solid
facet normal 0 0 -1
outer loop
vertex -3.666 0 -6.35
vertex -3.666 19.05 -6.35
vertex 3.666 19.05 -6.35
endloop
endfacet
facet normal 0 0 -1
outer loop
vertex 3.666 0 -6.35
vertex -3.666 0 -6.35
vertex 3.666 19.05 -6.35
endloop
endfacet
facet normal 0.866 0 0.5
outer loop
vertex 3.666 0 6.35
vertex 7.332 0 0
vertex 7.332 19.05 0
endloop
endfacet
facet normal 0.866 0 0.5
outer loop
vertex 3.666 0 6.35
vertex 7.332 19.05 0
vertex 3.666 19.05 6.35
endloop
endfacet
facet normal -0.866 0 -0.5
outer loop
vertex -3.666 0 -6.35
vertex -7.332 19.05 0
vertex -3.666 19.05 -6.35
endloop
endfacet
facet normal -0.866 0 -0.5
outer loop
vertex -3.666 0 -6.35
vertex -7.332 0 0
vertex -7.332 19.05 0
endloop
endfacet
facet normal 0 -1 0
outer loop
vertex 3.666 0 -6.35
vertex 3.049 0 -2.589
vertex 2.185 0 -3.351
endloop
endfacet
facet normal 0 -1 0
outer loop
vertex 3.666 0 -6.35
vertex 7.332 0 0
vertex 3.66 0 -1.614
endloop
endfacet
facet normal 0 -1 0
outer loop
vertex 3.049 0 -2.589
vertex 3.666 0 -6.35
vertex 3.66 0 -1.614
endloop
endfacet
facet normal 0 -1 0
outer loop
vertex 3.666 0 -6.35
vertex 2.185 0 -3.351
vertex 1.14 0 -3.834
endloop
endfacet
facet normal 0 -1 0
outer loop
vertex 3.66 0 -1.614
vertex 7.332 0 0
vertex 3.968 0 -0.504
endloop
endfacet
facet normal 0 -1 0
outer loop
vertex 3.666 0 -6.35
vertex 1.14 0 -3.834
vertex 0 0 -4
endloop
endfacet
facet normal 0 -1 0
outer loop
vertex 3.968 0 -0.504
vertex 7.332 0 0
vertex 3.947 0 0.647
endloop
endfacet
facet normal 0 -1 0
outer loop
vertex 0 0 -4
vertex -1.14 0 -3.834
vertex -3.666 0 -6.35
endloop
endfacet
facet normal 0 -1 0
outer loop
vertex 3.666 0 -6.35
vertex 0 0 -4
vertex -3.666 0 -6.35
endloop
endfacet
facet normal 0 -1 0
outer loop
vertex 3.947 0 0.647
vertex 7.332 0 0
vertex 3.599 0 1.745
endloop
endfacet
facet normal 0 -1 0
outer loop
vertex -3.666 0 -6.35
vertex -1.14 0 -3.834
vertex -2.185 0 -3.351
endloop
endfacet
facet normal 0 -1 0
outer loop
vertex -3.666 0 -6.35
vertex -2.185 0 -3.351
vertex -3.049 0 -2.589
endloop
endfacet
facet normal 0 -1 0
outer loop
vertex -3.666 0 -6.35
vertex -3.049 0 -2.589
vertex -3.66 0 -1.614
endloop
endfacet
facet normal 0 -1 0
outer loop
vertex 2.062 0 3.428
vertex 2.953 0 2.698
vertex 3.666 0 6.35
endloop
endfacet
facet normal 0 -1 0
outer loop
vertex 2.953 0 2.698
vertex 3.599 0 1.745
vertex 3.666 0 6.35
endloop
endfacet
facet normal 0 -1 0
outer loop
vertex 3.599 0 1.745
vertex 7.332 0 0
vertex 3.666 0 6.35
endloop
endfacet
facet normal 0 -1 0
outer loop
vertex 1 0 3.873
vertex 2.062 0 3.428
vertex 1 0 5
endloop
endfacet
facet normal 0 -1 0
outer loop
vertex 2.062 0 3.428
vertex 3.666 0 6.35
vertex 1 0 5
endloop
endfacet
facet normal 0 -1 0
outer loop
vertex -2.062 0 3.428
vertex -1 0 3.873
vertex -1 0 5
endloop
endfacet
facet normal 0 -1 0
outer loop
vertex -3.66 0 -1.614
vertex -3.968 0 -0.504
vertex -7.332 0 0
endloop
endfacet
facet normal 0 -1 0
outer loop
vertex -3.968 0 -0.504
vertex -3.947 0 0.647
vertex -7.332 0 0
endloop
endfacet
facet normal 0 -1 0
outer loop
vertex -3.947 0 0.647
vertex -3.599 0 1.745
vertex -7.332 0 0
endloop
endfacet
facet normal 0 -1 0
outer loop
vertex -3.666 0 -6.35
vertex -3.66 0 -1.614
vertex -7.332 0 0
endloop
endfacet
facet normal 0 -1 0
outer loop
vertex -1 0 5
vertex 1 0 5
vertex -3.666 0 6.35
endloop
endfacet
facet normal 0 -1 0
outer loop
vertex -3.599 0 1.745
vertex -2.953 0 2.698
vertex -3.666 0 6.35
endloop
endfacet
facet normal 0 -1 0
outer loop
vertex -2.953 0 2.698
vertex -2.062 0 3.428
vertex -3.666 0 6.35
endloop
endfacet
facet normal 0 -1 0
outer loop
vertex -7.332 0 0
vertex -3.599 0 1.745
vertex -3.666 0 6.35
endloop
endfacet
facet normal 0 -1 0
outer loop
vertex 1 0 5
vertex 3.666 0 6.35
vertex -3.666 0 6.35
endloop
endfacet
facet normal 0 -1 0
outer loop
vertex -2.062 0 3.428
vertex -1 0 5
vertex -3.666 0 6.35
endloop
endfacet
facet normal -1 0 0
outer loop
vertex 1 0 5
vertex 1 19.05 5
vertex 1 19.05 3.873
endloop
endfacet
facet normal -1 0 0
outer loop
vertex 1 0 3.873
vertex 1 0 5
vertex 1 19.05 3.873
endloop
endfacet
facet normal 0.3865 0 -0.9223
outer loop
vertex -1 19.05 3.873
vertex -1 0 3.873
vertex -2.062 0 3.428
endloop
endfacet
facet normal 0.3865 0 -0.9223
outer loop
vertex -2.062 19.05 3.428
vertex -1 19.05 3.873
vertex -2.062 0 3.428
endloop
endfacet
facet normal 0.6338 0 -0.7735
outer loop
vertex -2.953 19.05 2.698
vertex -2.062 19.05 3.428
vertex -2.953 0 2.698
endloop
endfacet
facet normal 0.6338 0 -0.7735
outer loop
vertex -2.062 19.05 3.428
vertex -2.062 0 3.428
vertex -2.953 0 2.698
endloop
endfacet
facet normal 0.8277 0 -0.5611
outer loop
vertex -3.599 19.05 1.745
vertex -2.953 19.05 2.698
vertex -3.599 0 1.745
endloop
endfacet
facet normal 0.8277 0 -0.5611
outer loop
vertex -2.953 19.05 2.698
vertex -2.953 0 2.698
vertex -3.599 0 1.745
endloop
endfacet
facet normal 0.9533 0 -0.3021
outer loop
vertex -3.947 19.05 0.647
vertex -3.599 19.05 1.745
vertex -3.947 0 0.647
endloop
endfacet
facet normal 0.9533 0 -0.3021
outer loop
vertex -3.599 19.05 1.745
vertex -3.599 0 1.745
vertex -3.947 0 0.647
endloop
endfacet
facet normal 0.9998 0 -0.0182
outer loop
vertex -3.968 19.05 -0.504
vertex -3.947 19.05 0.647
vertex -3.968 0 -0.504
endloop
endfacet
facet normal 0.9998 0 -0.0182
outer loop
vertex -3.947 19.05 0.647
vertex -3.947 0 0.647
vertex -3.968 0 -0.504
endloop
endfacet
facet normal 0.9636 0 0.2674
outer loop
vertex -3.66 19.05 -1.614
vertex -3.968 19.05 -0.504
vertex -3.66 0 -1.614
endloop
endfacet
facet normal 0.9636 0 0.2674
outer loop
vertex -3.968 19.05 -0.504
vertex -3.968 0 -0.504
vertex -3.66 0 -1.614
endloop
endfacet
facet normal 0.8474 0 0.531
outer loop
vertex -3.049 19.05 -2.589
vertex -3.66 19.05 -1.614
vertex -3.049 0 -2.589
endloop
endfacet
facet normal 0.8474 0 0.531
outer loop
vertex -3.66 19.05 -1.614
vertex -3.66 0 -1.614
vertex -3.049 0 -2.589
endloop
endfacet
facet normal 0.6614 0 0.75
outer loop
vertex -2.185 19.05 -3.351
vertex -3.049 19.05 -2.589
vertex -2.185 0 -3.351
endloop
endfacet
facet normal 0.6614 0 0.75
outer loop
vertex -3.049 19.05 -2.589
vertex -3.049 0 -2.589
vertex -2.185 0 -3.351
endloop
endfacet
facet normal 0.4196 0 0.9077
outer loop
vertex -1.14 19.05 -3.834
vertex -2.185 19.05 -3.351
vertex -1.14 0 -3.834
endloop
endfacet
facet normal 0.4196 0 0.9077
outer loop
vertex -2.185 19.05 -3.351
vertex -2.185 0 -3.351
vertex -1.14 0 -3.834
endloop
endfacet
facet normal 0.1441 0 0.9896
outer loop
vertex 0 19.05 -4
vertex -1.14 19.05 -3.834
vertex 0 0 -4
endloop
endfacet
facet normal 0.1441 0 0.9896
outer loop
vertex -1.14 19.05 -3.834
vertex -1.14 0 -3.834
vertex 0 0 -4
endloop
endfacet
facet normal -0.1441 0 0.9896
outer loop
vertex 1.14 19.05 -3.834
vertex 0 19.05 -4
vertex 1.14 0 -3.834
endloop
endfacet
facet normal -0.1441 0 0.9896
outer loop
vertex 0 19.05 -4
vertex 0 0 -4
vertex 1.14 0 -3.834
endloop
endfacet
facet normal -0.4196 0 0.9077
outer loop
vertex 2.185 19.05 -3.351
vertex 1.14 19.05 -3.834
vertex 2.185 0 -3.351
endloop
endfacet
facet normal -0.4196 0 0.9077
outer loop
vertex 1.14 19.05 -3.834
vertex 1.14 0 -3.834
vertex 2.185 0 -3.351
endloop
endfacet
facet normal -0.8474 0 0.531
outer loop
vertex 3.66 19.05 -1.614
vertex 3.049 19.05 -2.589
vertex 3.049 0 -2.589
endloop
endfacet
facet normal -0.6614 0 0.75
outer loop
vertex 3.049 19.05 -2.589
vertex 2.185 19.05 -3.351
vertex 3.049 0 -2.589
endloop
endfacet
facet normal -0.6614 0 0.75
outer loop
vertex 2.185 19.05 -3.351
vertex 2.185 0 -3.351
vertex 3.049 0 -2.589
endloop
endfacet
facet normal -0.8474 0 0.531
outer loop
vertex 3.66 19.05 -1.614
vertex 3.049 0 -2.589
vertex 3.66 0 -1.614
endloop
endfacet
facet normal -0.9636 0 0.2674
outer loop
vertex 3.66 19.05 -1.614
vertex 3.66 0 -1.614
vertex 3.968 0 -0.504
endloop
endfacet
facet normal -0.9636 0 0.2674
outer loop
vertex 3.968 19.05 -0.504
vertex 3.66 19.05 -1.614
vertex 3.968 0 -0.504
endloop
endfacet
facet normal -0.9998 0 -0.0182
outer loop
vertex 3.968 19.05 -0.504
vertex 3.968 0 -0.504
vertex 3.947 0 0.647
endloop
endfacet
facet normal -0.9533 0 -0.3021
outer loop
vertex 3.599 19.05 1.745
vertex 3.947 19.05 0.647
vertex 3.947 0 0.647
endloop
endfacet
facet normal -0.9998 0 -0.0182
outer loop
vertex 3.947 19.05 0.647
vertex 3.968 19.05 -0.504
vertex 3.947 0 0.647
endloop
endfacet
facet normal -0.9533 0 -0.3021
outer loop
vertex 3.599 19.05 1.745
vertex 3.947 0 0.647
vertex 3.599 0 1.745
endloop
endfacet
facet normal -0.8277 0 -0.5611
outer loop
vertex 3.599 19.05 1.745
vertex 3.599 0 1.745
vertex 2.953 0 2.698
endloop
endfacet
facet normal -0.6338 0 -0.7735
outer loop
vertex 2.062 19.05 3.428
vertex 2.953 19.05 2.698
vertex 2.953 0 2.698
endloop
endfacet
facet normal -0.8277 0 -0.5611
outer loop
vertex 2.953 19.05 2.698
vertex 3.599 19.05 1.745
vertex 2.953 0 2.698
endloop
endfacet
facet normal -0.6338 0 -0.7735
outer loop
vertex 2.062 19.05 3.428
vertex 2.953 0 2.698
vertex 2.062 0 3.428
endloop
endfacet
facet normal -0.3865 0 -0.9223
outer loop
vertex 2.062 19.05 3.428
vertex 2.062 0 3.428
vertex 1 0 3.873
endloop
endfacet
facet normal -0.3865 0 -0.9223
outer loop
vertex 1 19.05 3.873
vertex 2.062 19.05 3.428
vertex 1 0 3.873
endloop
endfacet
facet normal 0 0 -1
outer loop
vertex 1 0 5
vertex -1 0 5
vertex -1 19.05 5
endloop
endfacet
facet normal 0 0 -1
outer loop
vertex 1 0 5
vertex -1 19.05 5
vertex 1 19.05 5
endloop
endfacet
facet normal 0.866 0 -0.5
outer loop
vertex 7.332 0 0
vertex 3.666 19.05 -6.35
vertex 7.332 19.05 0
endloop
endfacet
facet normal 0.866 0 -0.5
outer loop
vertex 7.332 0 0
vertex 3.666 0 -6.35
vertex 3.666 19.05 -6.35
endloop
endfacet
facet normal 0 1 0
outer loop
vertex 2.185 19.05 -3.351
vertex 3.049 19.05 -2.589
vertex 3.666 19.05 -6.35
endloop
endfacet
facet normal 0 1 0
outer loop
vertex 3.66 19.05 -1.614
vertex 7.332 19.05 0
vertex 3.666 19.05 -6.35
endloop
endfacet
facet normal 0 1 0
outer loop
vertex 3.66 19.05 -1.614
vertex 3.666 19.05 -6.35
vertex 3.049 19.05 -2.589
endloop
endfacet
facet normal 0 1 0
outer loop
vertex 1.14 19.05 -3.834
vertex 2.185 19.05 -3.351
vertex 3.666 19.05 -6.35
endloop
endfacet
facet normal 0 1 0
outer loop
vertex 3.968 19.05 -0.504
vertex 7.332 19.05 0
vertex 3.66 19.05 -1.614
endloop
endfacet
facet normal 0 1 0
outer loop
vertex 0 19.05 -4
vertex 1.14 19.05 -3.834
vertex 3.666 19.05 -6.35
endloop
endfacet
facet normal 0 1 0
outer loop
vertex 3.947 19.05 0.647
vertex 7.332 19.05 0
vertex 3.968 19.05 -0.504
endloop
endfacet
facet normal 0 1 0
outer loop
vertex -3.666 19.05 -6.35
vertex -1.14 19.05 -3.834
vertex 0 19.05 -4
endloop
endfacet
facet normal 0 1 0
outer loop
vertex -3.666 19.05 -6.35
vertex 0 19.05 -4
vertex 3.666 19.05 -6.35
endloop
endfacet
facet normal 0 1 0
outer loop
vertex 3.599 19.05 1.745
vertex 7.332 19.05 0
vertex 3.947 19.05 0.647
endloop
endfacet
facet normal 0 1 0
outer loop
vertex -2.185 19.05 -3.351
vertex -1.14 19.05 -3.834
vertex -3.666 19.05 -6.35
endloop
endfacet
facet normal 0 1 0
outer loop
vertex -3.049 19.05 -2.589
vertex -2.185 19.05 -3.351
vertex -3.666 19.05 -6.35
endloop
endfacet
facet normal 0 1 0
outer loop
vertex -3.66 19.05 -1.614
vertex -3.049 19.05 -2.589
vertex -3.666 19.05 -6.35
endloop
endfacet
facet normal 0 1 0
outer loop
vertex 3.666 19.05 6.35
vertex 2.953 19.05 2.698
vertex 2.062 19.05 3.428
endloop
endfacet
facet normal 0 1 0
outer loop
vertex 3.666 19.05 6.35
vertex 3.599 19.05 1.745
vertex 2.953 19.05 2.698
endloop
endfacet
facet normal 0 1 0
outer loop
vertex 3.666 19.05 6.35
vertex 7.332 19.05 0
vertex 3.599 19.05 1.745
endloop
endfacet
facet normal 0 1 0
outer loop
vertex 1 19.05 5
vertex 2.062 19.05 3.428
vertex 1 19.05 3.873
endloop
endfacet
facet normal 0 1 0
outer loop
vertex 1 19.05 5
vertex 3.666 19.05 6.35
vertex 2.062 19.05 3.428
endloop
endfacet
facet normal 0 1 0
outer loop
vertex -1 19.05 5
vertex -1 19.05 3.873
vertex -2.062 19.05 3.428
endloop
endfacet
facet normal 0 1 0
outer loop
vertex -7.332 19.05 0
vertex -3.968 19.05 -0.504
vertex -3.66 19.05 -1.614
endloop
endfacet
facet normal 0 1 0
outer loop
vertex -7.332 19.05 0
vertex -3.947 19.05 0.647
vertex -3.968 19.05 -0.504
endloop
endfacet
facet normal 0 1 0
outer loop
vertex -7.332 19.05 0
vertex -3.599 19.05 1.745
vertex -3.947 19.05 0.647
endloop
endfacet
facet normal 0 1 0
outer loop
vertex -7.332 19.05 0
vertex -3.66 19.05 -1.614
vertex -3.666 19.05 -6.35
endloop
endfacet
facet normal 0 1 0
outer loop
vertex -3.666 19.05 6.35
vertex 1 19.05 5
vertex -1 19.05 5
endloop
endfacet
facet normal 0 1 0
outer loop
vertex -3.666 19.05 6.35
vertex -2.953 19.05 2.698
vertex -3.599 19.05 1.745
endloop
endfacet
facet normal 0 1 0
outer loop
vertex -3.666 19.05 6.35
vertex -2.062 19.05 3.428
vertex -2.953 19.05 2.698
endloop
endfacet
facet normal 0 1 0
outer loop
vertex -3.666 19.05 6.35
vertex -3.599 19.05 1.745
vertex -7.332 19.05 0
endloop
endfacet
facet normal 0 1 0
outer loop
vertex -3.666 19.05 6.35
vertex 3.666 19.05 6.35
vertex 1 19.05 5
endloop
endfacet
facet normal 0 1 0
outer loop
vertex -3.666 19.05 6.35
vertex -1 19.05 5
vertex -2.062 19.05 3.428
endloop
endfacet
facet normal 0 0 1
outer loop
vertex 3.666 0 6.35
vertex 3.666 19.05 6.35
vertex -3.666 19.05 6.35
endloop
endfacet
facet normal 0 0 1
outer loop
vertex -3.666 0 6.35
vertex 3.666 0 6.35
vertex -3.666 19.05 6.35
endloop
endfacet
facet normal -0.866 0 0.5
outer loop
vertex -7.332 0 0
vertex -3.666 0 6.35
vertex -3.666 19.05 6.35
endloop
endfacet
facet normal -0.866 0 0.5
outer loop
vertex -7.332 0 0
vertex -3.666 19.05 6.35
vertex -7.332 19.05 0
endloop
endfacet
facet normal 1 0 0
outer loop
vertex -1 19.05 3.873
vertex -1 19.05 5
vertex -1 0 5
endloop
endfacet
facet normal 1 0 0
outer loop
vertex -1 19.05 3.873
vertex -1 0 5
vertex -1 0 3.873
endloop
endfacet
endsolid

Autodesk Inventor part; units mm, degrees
ref_plane "YZ Plane" through (0, 0, 0) normal (1, 0, 0) x (0, 1, 0)
ref_plane "XZ Plane" through (0, 0, 0) normal (0, 1, 0) x (-1, 0, 0)
ref_plane "XY Plane" through (0, 0, 0) normal (0, 0, 1) x (1, 0, 0)
sketch "Sketch1" plane through (0, 0, 0) normal (0, 1, 0) x (-1, 0, 0)
  line L0 (3.6662, 6.35) -> (7.3323, 0)
  line L1 (7.3323, 0) -> (3.6662, -6.35)
  line L2 (3.6662, -6.35) -> (-3.6662, -6.35)
  line L3 (-3.6662, -6.35) -> (-7.3323, 0)
  line L4 (-7.3323, 0) -> (-3.6662, 6.35)
  line L5 (-3.6662, 6.35) -> (3.6662, 6.35)
  arc A0 (-1, 3.873) -> (1, 3.873) centre (0, 0) ccw
  line L6 (1, 5) -> (-1, 5)
  line L7 (-1, 5) -> (-1, 3.873)
  line L8 (1, 5) -> (1, 3.873)
  dimension "d0" = 12.7
  dimension "d1" = 8
  dimension "d2" = 2
  dimension "d3" = 1
  dimension "d4" = 5
extrude "Extrusion1" add sketch "Sketch1" along normal blind 19.05
properties part number "500 Hex CIM adapter"
